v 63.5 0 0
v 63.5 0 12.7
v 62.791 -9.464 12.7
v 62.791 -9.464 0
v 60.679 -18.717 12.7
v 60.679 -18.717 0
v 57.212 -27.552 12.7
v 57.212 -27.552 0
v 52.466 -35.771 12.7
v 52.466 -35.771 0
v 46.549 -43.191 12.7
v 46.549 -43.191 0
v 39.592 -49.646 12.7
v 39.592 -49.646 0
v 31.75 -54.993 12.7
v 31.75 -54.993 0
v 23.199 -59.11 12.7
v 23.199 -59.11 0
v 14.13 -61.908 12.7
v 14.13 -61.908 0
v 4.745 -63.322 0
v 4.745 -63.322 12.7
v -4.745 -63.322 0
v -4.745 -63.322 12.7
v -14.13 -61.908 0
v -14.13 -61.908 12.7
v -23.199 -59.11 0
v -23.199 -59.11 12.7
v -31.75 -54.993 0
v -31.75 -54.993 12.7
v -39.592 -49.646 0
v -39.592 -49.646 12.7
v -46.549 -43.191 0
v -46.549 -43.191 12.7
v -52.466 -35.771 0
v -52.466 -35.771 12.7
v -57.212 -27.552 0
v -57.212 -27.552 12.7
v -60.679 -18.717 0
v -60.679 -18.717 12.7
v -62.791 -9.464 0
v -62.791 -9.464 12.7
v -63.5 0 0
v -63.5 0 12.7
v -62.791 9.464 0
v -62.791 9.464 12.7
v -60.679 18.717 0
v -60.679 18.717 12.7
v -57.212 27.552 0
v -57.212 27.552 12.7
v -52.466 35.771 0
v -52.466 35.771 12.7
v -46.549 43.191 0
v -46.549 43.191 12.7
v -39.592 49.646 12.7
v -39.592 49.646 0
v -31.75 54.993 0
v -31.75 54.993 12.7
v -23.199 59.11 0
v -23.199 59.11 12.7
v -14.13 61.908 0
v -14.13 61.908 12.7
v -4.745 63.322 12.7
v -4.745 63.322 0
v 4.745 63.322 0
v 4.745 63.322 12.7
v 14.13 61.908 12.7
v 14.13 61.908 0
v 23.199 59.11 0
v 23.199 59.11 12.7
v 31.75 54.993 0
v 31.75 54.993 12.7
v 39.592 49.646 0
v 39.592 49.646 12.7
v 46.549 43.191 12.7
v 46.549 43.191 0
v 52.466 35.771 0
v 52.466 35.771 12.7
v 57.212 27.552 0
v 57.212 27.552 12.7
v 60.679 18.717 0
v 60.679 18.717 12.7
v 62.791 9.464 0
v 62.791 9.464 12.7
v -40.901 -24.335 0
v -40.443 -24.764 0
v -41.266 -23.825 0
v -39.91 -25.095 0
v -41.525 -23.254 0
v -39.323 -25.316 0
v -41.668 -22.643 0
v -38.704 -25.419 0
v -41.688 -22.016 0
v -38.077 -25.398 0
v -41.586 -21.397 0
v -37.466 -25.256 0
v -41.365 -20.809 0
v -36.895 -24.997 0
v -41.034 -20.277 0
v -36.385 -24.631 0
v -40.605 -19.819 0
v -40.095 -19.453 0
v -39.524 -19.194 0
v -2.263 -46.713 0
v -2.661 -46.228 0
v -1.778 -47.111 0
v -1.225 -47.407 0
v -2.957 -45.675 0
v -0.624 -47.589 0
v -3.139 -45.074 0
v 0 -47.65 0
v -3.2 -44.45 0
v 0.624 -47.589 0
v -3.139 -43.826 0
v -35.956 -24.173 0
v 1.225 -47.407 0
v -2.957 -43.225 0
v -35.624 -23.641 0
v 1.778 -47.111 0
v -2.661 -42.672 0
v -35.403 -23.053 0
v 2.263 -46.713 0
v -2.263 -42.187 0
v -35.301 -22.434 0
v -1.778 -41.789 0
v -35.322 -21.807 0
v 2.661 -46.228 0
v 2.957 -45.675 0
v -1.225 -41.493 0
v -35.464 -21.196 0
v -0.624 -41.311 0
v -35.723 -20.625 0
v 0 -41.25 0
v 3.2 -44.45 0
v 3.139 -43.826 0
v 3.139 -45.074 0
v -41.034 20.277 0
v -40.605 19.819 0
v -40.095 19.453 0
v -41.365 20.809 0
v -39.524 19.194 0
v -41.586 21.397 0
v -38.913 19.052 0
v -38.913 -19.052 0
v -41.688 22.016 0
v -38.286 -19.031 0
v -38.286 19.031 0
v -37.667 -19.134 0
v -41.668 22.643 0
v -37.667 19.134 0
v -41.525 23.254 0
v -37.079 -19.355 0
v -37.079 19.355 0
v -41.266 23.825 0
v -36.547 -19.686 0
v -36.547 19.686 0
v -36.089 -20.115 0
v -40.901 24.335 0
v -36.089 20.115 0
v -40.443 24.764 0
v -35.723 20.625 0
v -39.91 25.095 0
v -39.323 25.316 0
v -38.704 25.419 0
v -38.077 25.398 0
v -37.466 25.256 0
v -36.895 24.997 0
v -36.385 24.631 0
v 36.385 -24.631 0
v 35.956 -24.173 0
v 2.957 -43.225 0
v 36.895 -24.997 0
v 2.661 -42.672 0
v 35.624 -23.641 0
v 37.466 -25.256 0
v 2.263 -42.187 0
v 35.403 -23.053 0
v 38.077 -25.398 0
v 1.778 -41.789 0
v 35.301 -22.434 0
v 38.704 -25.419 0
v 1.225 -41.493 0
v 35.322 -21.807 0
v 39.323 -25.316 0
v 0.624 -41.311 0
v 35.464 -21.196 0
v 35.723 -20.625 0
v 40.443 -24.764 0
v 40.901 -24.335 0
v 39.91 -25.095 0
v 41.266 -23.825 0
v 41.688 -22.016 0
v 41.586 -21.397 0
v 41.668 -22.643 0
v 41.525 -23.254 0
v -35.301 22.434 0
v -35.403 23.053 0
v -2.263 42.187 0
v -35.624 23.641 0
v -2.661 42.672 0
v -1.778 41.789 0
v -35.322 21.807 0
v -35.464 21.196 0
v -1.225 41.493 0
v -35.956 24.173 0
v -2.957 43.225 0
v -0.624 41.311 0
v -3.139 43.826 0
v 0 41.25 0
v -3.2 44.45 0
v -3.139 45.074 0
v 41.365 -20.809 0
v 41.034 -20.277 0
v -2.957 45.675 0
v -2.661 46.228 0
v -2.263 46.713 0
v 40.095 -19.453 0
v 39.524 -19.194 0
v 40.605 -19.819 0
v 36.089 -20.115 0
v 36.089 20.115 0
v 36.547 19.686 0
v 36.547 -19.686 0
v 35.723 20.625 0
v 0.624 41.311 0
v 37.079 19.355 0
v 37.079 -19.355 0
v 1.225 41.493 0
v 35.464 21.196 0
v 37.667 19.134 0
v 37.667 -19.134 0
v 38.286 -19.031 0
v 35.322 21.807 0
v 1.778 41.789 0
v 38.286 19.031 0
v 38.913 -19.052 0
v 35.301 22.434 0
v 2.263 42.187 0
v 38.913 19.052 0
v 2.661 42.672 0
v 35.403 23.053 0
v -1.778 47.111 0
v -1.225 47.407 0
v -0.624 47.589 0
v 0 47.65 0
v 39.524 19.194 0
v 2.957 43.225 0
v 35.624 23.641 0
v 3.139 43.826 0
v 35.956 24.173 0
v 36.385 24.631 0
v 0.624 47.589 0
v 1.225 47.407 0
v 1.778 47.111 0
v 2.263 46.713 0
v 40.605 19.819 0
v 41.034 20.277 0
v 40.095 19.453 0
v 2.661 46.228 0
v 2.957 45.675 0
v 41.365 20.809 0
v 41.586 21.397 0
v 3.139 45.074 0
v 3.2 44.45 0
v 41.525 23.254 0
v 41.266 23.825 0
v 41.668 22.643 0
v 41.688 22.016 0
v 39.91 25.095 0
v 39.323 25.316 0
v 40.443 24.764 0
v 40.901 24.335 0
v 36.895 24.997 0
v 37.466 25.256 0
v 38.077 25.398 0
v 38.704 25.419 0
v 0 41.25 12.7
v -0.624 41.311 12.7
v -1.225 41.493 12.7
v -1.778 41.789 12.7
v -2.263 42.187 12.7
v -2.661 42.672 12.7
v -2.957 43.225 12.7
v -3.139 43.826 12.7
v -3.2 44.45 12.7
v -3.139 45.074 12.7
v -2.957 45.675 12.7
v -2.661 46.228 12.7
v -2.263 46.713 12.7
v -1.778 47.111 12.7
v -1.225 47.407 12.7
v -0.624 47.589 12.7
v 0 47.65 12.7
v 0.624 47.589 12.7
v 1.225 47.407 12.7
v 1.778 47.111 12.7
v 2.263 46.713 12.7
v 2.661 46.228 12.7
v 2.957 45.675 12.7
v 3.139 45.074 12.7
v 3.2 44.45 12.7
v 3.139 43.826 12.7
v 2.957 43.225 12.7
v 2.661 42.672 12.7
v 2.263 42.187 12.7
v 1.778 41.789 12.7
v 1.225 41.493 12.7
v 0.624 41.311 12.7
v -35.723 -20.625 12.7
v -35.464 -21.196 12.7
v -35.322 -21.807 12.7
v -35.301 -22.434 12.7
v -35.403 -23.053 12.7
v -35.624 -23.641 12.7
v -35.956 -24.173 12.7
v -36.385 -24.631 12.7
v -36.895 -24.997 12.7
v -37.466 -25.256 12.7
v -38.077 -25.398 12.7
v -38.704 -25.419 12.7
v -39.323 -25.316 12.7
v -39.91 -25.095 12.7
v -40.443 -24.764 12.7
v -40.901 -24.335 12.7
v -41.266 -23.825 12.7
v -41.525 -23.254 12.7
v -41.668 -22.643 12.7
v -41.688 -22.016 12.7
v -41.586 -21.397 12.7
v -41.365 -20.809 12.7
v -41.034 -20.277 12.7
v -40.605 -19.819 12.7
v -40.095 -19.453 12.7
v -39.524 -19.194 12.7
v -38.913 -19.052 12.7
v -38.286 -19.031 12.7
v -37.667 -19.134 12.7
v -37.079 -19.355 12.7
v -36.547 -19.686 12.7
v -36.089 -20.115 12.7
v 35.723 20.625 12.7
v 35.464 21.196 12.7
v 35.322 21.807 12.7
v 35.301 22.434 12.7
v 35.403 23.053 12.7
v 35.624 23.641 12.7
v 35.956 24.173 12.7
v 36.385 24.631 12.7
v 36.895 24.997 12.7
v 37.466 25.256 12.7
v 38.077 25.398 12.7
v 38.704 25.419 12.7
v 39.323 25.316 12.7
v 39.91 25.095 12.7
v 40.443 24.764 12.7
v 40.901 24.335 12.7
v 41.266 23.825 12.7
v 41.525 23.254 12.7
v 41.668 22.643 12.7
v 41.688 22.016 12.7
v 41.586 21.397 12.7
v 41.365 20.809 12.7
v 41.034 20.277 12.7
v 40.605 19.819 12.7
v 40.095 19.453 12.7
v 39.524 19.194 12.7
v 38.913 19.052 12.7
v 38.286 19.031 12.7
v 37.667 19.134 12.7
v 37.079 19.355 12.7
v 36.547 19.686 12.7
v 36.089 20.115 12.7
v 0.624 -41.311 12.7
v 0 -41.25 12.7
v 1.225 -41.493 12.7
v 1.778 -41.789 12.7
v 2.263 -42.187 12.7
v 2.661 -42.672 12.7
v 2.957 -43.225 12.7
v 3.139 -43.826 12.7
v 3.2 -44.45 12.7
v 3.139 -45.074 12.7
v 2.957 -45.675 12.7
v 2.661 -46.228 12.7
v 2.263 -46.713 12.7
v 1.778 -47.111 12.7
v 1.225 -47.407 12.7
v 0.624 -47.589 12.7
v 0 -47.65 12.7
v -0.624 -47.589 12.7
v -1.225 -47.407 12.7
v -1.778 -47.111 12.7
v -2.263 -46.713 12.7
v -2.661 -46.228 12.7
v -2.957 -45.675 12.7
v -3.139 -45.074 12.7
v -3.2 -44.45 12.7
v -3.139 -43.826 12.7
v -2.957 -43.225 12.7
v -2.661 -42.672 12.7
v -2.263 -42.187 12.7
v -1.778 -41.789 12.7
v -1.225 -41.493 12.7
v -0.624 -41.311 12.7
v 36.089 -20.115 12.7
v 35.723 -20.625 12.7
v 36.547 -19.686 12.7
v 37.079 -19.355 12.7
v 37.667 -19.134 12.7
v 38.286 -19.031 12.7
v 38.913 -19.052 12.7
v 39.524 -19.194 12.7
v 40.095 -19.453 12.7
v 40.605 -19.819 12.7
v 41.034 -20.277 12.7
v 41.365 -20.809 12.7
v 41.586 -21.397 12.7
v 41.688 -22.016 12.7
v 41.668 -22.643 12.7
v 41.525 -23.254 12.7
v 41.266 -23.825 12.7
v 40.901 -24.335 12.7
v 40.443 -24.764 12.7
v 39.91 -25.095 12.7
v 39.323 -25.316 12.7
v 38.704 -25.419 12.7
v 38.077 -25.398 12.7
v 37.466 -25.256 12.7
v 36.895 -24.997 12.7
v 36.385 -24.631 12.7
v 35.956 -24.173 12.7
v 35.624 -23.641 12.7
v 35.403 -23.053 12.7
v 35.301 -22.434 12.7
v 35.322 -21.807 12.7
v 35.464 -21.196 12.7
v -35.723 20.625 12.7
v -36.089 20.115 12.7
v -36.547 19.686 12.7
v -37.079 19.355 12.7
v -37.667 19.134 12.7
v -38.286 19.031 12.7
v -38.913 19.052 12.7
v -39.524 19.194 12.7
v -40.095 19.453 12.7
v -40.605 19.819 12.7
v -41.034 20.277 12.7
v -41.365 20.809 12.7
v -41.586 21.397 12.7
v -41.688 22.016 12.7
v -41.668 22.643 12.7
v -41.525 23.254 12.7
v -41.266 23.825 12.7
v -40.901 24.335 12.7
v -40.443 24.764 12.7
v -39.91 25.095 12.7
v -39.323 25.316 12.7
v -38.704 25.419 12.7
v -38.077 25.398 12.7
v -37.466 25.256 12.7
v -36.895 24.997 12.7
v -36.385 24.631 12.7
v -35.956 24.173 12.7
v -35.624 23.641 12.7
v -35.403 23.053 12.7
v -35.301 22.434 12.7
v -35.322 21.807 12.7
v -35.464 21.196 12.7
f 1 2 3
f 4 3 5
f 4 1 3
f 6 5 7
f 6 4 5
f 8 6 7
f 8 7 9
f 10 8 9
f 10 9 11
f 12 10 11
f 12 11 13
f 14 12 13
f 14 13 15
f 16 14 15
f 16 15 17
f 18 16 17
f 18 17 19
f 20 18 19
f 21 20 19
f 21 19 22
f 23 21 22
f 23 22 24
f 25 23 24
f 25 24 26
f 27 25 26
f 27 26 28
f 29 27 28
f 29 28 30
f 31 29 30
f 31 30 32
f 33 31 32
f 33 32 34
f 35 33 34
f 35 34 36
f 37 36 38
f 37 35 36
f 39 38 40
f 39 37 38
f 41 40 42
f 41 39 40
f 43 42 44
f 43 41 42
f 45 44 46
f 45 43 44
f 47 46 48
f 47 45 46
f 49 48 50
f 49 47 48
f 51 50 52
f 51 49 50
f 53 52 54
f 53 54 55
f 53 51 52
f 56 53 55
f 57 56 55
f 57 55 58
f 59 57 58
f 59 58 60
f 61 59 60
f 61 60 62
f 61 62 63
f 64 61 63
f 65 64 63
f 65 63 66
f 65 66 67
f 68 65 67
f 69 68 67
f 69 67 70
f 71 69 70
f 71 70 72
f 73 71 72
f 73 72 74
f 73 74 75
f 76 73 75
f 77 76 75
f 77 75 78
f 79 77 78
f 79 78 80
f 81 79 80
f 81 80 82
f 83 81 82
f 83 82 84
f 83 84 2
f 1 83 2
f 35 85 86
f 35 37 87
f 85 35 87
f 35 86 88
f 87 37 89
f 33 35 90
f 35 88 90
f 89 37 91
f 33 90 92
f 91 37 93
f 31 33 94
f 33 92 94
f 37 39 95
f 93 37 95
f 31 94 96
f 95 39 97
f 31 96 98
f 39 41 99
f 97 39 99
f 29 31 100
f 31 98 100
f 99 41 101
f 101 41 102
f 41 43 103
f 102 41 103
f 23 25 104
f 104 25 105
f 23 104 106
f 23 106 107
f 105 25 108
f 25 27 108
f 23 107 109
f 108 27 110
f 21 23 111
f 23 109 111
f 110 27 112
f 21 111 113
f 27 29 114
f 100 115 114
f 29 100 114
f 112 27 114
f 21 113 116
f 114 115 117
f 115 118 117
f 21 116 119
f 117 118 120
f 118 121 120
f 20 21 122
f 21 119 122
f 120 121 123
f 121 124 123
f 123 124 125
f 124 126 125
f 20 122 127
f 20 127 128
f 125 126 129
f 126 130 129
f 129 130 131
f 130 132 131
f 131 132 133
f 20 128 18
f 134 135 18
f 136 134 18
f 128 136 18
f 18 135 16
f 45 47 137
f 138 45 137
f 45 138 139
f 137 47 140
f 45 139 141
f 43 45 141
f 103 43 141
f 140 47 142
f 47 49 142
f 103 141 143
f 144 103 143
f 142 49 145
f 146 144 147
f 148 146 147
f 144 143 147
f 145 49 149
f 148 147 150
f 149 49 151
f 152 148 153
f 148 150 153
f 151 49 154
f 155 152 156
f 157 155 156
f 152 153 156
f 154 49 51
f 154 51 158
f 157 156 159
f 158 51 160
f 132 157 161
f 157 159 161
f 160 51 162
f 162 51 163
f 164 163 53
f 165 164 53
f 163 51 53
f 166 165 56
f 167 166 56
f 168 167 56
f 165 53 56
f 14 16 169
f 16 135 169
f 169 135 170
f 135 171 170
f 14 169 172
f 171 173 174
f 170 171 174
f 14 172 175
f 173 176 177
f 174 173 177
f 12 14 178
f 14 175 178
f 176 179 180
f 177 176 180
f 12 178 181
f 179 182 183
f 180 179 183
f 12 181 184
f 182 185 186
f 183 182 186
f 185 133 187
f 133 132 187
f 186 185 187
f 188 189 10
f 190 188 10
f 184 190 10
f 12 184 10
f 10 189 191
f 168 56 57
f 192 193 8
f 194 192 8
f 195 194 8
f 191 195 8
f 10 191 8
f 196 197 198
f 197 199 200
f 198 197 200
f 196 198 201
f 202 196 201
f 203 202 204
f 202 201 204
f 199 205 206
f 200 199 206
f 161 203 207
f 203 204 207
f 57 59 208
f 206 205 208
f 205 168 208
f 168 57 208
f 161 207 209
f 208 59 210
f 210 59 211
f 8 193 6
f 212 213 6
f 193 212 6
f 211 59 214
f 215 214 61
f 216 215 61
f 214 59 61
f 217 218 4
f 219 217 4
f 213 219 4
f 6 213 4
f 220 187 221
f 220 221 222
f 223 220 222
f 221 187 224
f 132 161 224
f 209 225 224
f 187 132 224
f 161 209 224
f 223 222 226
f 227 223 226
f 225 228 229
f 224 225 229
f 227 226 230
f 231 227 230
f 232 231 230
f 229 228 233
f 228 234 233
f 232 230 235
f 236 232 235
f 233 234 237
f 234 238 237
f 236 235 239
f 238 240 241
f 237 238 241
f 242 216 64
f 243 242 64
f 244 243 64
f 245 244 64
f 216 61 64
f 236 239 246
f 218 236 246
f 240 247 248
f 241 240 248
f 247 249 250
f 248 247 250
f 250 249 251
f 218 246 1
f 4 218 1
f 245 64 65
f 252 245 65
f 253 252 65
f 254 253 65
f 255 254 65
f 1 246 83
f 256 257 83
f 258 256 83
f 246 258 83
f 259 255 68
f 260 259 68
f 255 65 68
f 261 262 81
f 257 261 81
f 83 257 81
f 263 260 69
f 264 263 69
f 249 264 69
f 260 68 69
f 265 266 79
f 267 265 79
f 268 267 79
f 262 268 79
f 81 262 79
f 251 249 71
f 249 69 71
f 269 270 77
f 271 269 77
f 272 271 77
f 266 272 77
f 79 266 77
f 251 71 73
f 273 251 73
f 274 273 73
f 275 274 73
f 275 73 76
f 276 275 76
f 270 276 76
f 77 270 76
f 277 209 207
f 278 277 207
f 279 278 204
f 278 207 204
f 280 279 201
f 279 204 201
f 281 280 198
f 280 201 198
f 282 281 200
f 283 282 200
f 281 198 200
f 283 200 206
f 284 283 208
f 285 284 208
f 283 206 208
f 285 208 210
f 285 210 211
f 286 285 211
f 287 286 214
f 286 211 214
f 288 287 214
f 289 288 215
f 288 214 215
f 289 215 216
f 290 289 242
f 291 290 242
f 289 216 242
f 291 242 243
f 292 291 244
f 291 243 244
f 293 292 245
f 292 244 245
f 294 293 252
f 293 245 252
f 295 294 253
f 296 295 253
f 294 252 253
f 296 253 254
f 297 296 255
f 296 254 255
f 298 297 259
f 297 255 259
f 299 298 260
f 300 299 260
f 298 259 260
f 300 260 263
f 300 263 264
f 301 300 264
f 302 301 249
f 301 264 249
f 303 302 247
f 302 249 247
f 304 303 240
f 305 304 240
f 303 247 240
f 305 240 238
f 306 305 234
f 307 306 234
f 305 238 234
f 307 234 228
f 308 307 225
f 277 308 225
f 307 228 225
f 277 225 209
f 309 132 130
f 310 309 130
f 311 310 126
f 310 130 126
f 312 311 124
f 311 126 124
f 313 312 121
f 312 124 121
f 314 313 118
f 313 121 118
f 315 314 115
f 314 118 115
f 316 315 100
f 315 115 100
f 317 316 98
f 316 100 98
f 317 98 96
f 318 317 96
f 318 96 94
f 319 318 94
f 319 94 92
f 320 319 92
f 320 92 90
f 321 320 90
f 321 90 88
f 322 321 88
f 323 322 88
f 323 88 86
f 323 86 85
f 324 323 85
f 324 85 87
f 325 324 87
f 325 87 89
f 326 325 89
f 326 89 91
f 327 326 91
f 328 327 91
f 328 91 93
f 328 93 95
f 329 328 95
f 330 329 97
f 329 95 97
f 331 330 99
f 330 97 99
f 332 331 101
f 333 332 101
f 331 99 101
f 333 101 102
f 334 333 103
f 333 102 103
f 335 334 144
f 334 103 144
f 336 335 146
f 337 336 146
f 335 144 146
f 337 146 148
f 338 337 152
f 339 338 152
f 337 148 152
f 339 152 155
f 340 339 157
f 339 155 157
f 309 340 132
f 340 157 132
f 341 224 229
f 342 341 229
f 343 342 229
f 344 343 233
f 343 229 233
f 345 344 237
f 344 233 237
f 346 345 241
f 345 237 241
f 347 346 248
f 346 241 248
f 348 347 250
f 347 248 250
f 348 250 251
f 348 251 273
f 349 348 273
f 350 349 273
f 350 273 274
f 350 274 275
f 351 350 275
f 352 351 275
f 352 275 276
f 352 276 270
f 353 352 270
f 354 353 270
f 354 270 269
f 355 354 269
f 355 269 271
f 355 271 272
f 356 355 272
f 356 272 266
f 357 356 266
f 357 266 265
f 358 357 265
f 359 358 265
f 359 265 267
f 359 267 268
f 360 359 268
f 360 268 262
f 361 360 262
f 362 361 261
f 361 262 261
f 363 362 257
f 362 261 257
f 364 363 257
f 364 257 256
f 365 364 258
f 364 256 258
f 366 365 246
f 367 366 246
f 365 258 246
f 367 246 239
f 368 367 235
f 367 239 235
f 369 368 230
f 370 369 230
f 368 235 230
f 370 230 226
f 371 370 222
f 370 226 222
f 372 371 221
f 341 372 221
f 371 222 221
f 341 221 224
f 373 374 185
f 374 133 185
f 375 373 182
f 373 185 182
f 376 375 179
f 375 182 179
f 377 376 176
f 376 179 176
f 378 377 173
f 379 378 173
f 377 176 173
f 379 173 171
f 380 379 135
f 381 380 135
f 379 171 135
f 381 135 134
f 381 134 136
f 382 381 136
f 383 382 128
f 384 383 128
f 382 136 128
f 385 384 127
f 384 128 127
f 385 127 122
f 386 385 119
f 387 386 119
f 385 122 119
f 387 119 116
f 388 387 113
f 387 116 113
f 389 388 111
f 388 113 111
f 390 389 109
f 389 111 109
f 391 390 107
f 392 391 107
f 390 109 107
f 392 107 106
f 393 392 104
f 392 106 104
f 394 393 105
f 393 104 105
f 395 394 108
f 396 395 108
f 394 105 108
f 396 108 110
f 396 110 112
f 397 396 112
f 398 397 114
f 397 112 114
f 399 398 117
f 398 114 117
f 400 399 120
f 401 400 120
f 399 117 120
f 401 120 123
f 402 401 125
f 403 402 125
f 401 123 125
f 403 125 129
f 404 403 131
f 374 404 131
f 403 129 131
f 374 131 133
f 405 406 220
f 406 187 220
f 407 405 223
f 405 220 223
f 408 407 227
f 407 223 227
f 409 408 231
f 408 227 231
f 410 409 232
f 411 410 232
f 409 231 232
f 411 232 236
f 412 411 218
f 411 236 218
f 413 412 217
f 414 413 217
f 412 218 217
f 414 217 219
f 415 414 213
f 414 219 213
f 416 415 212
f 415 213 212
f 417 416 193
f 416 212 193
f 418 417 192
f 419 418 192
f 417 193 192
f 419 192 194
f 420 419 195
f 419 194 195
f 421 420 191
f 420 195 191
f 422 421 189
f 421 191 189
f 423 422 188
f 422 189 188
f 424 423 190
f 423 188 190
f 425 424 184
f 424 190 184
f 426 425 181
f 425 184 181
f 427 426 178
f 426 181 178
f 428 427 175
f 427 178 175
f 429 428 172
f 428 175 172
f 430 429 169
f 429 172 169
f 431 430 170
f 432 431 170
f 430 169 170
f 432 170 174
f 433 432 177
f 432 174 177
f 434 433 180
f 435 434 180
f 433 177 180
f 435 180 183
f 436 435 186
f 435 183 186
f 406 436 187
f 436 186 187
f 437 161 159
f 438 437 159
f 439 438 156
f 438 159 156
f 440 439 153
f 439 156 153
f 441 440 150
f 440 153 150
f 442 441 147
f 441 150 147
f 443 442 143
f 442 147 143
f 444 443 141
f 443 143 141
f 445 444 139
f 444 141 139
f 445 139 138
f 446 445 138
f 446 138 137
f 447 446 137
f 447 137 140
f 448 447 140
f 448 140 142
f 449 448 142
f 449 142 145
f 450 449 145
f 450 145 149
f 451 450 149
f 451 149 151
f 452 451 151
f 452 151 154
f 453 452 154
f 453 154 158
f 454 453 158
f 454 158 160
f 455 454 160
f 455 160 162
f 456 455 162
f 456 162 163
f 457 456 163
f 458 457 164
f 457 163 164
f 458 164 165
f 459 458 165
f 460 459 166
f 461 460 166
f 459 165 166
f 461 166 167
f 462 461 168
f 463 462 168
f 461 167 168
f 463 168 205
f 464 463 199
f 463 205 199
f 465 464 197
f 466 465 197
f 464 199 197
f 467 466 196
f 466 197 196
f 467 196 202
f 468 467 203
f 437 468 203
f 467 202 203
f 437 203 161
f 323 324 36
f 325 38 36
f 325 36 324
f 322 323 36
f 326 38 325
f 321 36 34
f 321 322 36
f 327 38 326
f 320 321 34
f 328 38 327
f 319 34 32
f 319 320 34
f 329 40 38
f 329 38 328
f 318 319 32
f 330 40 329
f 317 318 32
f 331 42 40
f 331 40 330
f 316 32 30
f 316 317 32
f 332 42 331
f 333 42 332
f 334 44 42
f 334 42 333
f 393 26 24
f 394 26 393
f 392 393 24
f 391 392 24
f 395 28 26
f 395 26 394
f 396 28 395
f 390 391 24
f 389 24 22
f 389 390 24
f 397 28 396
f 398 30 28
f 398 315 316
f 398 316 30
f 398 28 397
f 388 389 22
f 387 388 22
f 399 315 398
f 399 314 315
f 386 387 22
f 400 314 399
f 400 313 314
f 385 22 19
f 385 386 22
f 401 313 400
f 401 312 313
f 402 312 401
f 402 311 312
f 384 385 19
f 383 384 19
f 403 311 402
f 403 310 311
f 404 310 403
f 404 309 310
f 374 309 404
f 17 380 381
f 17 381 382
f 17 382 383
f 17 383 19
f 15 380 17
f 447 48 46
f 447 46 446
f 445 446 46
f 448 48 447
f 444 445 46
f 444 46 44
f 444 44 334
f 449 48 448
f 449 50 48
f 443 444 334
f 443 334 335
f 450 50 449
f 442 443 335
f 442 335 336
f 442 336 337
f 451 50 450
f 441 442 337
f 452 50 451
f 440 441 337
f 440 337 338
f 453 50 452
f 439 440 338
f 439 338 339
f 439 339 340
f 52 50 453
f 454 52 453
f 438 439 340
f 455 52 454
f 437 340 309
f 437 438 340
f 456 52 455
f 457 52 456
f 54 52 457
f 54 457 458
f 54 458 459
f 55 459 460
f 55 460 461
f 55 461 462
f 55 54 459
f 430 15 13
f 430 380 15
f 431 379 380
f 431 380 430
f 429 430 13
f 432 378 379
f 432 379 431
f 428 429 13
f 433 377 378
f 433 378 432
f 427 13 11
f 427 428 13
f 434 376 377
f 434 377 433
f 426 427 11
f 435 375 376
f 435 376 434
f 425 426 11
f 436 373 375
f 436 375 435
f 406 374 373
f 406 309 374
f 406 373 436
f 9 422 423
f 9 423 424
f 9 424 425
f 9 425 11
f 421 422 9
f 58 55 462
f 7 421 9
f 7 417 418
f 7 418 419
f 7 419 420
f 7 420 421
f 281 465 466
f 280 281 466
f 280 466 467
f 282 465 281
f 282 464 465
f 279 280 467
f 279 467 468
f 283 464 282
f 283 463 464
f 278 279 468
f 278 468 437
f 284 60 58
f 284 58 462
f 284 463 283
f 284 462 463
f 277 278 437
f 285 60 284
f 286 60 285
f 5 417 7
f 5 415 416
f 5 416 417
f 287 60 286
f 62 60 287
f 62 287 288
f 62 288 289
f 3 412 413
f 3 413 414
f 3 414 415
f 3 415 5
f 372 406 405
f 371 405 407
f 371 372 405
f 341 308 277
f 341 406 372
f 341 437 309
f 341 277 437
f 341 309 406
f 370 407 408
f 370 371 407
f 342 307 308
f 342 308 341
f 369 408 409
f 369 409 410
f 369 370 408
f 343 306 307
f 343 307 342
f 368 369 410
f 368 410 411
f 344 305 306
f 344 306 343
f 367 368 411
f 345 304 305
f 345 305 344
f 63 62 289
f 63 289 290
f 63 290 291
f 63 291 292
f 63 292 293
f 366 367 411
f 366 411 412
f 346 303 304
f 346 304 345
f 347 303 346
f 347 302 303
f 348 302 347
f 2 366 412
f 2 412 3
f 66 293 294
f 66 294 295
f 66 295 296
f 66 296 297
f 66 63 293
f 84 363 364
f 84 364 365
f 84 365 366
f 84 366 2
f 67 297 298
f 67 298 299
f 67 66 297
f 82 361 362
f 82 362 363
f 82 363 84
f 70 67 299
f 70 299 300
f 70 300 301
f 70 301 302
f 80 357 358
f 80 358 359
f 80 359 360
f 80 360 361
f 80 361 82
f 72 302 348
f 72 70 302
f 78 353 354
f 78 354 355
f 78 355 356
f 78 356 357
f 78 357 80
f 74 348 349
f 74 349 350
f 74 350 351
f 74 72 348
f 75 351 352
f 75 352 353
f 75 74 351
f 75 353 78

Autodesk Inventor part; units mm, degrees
ref_plane "YZ Plane" through (0, 0, 0) normal (1, 0, 0) x (0, 1, 0)
ref_plane "XZ Plane" through (0, 0, 0) normal (0, 1, 0) x (-1, 0, 0)
ref_plane "XY Plane" through (0, 0, 0) normal (0, 0, 1) x (1, 0, 0)
sketch "Sketch1" plane through (0, 0, 0) normal (0, 0, 1) x (1, 0, 0)
  line L0 (-142.24, 0) -> (142.24, 0) projected
  line L1 (0, -142.24) -> (0, 142.24) projected
  circle A0 centre (0, 0) radius 63.5
  circle A1 centre (0, 0) radius 50.8 construction
  circle A2 centre (0, 0) radius 101.6 construction
  dimension "d0" = 101.6
  dimension "d1" = 127
  dimension "d20" = 203.2
extrude "Extrusion1" add sketch "Sketch1" along normal blind 12.7
sketch "Sketch4" plane through (0, 0, 12.7) normal (0, 0, 1) x (1, 0, 0)
  line L0 (-88.9, 0) -> (88.9, 0) projected
  line L1 (0, -88.9) -> (0, 88.9) projected
  point P0 (0, 44.45)
  dimension "d21" = 44.45
hole "Hole2" at (0, 44.45, 12.7) direction (0, 0, -1) diameter 6.4008 end through all thread size "5/16-18 UNC" class "2B" standard "ANSI Unified Screw Threads"
pattern_circular "Circular Pattern1" count 6 over 360 about axis through (0, 0, -10) along (0, 0, 1) of "Hole2"
properties part number "wheel hub"
